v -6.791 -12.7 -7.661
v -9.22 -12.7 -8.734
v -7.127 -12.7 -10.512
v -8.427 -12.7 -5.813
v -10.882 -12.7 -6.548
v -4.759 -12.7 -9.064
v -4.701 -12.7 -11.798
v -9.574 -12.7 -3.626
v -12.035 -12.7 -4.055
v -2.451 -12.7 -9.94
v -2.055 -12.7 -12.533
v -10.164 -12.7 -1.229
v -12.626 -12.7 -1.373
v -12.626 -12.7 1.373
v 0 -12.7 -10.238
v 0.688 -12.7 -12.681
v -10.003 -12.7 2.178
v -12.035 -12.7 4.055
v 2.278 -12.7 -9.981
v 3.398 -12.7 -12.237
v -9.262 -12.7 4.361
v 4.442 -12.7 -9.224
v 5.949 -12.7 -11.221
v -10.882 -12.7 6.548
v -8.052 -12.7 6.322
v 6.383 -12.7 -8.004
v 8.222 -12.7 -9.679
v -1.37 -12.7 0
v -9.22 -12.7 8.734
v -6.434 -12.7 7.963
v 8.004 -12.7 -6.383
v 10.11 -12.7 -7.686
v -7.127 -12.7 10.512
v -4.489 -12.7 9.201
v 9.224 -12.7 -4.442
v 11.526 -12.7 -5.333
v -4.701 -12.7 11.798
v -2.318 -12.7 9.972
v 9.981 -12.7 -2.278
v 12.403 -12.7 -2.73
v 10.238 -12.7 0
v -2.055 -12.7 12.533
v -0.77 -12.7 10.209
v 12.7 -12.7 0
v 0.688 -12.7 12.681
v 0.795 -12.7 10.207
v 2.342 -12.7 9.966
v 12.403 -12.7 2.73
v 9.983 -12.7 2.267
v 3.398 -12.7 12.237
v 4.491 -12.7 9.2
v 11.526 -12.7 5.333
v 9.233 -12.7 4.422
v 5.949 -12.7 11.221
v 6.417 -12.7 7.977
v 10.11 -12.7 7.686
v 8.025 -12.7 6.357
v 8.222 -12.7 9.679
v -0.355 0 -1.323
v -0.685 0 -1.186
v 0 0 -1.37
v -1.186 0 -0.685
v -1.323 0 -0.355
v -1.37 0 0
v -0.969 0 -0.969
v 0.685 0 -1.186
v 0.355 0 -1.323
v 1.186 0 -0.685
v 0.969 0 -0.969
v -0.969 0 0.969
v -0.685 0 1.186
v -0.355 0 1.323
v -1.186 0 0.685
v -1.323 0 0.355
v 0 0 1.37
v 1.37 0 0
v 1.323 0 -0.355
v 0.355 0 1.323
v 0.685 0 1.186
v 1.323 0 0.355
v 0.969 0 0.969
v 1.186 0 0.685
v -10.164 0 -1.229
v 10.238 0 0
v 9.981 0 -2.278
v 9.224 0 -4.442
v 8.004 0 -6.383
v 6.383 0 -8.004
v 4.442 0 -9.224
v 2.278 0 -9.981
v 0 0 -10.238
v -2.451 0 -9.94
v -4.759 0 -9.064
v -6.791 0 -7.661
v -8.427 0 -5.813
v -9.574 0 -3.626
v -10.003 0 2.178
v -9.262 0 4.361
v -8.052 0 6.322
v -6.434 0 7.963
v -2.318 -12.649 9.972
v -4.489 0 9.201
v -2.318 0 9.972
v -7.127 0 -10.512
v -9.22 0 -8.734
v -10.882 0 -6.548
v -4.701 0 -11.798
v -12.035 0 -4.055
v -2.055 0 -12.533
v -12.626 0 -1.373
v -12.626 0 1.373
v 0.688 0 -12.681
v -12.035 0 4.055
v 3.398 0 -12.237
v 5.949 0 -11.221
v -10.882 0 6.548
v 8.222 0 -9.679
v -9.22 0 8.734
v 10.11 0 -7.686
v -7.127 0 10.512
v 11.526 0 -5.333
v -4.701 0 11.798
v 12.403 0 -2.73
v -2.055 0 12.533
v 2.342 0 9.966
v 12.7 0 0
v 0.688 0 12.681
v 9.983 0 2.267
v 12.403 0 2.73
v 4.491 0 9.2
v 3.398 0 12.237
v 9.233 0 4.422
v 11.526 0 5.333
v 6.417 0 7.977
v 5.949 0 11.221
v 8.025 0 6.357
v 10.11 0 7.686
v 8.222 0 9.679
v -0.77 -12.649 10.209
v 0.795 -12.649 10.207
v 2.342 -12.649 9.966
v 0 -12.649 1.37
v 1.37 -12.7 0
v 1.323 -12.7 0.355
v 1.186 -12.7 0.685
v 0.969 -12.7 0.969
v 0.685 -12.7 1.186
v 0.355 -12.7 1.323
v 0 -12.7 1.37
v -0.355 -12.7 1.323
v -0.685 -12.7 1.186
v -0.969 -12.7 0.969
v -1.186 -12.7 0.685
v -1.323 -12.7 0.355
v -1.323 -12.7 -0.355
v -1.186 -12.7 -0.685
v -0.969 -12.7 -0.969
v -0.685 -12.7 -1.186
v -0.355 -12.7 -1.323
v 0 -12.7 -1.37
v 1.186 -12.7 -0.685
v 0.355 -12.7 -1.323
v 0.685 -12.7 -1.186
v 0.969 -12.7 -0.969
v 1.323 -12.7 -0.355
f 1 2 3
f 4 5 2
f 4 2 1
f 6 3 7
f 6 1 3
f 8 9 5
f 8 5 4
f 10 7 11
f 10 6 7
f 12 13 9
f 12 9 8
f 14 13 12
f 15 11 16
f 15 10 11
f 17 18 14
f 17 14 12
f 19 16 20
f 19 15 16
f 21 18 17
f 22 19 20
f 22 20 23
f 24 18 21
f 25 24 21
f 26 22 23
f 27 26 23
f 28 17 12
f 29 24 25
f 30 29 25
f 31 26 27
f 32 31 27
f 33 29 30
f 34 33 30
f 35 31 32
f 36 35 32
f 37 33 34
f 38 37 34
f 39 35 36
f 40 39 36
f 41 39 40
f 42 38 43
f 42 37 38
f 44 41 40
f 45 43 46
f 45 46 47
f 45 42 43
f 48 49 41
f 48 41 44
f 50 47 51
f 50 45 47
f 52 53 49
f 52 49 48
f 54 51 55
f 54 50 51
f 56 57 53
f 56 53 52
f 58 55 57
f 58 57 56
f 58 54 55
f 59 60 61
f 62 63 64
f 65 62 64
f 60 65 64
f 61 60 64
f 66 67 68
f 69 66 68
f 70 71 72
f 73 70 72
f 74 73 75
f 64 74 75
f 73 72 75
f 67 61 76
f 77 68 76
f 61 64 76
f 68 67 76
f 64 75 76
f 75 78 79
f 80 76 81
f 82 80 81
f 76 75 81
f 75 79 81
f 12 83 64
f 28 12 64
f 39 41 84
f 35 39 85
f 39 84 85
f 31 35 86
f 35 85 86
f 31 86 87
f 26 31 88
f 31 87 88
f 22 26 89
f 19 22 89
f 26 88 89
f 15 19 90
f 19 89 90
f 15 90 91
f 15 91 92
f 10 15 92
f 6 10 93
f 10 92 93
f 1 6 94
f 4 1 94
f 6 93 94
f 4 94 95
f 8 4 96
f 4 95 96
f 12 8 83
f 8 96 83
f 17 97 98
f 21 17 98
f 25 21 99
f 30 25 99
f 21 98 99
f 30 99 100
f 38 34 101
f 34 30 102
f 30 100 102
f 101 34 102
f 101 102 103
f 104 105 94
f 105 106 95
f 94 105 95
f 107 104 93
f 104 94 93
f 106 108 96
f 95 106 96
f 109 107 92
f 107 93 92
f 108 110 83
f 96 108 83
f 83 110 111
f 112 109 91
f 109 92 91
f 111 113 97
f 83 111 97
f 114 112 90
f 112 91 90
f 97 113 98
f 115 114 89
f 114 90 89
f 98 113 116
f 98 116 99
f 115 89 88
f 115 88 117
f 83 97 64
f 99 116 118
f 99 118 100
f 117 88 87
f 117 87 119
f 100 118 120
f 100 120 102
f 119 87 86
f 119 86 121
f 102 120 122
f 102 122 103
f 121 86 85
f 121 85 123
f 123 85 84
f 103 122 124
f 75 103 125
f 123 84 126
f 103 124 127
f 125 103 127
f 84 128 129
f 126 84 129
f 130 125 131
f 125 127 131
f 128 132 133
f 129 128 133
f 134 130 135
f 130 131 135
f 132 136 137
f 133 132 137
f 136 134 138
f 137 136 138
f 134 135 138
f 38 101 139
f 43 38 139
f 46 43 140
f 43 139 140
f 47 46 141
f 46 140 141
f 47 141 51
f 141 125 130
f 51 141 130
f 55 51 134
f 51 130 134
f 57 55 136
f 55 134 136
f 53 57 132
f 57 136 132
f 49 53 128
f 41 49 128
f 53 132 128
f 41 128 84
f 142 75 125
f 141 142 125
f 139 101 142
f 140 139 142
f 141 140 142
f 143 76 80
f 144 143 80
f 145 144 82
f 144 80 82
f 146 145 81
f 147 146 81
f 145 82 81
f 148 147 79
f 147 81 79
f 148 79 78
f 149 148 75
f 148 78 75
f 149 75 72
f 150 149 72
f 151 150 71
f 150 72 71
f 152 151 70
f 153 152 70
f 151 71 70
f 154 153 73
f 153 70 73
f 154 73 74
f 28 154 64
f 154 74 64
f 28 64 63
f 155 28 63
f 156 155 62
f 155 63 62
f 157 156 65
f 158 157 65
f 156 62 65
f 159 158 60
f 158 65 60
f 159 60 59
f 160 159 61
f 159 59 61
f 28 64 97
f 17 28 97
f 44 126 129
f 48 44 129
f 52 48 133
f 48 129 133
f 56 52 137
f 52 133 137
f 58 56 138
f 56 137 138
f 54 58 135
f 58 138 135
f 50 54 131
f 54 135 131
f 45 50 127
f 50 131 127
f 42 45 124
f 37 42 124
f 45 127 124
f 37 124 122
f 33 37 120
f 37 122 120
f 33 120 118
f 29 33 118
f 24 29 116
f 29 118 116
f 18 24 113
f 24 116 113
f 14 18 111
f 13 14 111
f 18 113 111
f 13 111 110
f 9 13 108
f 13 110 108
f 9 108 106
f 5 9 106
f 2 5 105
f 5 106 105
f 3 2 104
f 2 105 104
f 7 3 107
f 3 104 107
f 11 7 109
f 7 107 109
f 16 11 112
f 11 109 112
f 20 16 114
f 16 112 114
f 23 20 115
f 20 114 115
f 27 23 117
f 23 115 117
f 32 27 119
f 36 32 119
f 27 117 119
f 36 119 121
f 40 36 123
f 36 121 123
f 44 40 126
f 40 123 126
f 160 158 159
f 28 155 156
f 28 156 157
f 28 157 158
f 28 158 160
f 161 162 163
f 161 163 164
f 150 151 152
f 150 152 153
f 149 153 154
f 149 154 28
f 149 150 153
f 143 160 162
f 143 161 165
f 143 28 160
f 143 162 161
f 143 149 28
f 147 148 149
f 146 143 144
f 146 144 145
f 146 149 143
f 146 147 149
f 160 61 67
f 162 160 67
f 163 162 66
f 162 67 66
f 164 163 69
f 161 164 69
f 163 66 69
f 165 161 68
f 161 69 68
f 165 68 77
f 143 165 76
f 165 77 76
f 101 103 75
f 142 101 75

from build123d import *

# Parameters (mm, degrees)
F0_R     = 12.7
F1_DEPTH = 12.7
F2_DEPTH = 12.7
F4_DEPTH = 12.6492


# Not quite as in the source:
# - a feature of the source that left no trace in its solid (it failed there, or was rolled back) is left out


with BuildPart() as f1:
    # F0 (on Front) → F1 (new body)
    with BuildSketch(Plane.XZ):
        Circle(F0_R)
        with BuildLine():
            ThreePointArc((2.342264303, 9.9660302686), (8.0245582458, 6.3572341736), (10.2375759523, 0))
            ThreePointArc((10.2375759523, 0), (7.2390593788, -7.2390593788), (0, -10.2375759523))
            ThreePointArc((0, -10.2375759523), (-6.7907141872, -7.6612115365), (-10.1635578802, -1.2288419733))
            ThreePointArc((-10.1635578802, -1.2288419733), (-10.2262516737, 0.4813918215), (-10.003175629, 2.178173252))
            ThreePointArc((-10.003175629, 2.178173252), (-7.2893862495, 7.1883801711), (-2.3175314223, 9.9718107426))
            ThreePointArc((-2.3175314223, 9.9718107426), (0.0126996975, 10.2375680753), (2.342264303, 9.9660302686))
        make_face(mode=Mode.SUBTRACT)
    extrude(amount=F1_DEPTH)

    # F0 (on Front) → F2 (join)
    with BuildSketch(Plane.XZ):
        with BuildLine():
            ThreePointArc((-10.003175629, 2.178173252), (-10.2262516737, 0.4813918215), (-10.1635578802, -1.2288419733))
            Line((-10.1635578802, -1.2288419733), (-1.3697025857, 0))
            Line((-1.3697025857, 0), (-10.003175629, 2.178173252))
        make_face()
    extrude(amount=F2_DEPTH)

    # F0 (on Front) → F4 (join)
    with BuildSketch(Plane.XZ):
        with BuildLine():
            Line((0, 1.3697025857), (2.342264303, 9.9660302686))
            ThreePointArc((2.342264303, 9.9660302686), (0.0126996975, 10.2375680753), (-2.3175314223, 9.9718107426))
            Line((-2.3175314223, 9.9718107426), (0, 1.3697025857))
        make_face()
    extrude(amount=F4_DEPTH)


with BuildPart() as f1b:
    # F0 (on Front) → F1, piece 2 (new body)
    with BuildSketch(Plane.XZ):
        with BuildLine():
            ThreePointArc((0, -1.3697025857), (0.9685259866, -0.9685259866), (1.3697025857, 0))
            ThreePointArc((1.3697025857, 0), (0.9685259866, 0.9685259866), (0, 1.3697025857))
            ThreePointArc((0, 1.3697025857), (-0.9685259866, 0.9685259866), (-1.3697025857, 0))
            ThreePointArc((-1.3697025857, 0), (-0.9685259866, -0.9685259866), (0, -1.3697025857))
        make_face()
    extrude(amount=F1_DEPTH)


solid = Compound([f1.part, f1b.part])
